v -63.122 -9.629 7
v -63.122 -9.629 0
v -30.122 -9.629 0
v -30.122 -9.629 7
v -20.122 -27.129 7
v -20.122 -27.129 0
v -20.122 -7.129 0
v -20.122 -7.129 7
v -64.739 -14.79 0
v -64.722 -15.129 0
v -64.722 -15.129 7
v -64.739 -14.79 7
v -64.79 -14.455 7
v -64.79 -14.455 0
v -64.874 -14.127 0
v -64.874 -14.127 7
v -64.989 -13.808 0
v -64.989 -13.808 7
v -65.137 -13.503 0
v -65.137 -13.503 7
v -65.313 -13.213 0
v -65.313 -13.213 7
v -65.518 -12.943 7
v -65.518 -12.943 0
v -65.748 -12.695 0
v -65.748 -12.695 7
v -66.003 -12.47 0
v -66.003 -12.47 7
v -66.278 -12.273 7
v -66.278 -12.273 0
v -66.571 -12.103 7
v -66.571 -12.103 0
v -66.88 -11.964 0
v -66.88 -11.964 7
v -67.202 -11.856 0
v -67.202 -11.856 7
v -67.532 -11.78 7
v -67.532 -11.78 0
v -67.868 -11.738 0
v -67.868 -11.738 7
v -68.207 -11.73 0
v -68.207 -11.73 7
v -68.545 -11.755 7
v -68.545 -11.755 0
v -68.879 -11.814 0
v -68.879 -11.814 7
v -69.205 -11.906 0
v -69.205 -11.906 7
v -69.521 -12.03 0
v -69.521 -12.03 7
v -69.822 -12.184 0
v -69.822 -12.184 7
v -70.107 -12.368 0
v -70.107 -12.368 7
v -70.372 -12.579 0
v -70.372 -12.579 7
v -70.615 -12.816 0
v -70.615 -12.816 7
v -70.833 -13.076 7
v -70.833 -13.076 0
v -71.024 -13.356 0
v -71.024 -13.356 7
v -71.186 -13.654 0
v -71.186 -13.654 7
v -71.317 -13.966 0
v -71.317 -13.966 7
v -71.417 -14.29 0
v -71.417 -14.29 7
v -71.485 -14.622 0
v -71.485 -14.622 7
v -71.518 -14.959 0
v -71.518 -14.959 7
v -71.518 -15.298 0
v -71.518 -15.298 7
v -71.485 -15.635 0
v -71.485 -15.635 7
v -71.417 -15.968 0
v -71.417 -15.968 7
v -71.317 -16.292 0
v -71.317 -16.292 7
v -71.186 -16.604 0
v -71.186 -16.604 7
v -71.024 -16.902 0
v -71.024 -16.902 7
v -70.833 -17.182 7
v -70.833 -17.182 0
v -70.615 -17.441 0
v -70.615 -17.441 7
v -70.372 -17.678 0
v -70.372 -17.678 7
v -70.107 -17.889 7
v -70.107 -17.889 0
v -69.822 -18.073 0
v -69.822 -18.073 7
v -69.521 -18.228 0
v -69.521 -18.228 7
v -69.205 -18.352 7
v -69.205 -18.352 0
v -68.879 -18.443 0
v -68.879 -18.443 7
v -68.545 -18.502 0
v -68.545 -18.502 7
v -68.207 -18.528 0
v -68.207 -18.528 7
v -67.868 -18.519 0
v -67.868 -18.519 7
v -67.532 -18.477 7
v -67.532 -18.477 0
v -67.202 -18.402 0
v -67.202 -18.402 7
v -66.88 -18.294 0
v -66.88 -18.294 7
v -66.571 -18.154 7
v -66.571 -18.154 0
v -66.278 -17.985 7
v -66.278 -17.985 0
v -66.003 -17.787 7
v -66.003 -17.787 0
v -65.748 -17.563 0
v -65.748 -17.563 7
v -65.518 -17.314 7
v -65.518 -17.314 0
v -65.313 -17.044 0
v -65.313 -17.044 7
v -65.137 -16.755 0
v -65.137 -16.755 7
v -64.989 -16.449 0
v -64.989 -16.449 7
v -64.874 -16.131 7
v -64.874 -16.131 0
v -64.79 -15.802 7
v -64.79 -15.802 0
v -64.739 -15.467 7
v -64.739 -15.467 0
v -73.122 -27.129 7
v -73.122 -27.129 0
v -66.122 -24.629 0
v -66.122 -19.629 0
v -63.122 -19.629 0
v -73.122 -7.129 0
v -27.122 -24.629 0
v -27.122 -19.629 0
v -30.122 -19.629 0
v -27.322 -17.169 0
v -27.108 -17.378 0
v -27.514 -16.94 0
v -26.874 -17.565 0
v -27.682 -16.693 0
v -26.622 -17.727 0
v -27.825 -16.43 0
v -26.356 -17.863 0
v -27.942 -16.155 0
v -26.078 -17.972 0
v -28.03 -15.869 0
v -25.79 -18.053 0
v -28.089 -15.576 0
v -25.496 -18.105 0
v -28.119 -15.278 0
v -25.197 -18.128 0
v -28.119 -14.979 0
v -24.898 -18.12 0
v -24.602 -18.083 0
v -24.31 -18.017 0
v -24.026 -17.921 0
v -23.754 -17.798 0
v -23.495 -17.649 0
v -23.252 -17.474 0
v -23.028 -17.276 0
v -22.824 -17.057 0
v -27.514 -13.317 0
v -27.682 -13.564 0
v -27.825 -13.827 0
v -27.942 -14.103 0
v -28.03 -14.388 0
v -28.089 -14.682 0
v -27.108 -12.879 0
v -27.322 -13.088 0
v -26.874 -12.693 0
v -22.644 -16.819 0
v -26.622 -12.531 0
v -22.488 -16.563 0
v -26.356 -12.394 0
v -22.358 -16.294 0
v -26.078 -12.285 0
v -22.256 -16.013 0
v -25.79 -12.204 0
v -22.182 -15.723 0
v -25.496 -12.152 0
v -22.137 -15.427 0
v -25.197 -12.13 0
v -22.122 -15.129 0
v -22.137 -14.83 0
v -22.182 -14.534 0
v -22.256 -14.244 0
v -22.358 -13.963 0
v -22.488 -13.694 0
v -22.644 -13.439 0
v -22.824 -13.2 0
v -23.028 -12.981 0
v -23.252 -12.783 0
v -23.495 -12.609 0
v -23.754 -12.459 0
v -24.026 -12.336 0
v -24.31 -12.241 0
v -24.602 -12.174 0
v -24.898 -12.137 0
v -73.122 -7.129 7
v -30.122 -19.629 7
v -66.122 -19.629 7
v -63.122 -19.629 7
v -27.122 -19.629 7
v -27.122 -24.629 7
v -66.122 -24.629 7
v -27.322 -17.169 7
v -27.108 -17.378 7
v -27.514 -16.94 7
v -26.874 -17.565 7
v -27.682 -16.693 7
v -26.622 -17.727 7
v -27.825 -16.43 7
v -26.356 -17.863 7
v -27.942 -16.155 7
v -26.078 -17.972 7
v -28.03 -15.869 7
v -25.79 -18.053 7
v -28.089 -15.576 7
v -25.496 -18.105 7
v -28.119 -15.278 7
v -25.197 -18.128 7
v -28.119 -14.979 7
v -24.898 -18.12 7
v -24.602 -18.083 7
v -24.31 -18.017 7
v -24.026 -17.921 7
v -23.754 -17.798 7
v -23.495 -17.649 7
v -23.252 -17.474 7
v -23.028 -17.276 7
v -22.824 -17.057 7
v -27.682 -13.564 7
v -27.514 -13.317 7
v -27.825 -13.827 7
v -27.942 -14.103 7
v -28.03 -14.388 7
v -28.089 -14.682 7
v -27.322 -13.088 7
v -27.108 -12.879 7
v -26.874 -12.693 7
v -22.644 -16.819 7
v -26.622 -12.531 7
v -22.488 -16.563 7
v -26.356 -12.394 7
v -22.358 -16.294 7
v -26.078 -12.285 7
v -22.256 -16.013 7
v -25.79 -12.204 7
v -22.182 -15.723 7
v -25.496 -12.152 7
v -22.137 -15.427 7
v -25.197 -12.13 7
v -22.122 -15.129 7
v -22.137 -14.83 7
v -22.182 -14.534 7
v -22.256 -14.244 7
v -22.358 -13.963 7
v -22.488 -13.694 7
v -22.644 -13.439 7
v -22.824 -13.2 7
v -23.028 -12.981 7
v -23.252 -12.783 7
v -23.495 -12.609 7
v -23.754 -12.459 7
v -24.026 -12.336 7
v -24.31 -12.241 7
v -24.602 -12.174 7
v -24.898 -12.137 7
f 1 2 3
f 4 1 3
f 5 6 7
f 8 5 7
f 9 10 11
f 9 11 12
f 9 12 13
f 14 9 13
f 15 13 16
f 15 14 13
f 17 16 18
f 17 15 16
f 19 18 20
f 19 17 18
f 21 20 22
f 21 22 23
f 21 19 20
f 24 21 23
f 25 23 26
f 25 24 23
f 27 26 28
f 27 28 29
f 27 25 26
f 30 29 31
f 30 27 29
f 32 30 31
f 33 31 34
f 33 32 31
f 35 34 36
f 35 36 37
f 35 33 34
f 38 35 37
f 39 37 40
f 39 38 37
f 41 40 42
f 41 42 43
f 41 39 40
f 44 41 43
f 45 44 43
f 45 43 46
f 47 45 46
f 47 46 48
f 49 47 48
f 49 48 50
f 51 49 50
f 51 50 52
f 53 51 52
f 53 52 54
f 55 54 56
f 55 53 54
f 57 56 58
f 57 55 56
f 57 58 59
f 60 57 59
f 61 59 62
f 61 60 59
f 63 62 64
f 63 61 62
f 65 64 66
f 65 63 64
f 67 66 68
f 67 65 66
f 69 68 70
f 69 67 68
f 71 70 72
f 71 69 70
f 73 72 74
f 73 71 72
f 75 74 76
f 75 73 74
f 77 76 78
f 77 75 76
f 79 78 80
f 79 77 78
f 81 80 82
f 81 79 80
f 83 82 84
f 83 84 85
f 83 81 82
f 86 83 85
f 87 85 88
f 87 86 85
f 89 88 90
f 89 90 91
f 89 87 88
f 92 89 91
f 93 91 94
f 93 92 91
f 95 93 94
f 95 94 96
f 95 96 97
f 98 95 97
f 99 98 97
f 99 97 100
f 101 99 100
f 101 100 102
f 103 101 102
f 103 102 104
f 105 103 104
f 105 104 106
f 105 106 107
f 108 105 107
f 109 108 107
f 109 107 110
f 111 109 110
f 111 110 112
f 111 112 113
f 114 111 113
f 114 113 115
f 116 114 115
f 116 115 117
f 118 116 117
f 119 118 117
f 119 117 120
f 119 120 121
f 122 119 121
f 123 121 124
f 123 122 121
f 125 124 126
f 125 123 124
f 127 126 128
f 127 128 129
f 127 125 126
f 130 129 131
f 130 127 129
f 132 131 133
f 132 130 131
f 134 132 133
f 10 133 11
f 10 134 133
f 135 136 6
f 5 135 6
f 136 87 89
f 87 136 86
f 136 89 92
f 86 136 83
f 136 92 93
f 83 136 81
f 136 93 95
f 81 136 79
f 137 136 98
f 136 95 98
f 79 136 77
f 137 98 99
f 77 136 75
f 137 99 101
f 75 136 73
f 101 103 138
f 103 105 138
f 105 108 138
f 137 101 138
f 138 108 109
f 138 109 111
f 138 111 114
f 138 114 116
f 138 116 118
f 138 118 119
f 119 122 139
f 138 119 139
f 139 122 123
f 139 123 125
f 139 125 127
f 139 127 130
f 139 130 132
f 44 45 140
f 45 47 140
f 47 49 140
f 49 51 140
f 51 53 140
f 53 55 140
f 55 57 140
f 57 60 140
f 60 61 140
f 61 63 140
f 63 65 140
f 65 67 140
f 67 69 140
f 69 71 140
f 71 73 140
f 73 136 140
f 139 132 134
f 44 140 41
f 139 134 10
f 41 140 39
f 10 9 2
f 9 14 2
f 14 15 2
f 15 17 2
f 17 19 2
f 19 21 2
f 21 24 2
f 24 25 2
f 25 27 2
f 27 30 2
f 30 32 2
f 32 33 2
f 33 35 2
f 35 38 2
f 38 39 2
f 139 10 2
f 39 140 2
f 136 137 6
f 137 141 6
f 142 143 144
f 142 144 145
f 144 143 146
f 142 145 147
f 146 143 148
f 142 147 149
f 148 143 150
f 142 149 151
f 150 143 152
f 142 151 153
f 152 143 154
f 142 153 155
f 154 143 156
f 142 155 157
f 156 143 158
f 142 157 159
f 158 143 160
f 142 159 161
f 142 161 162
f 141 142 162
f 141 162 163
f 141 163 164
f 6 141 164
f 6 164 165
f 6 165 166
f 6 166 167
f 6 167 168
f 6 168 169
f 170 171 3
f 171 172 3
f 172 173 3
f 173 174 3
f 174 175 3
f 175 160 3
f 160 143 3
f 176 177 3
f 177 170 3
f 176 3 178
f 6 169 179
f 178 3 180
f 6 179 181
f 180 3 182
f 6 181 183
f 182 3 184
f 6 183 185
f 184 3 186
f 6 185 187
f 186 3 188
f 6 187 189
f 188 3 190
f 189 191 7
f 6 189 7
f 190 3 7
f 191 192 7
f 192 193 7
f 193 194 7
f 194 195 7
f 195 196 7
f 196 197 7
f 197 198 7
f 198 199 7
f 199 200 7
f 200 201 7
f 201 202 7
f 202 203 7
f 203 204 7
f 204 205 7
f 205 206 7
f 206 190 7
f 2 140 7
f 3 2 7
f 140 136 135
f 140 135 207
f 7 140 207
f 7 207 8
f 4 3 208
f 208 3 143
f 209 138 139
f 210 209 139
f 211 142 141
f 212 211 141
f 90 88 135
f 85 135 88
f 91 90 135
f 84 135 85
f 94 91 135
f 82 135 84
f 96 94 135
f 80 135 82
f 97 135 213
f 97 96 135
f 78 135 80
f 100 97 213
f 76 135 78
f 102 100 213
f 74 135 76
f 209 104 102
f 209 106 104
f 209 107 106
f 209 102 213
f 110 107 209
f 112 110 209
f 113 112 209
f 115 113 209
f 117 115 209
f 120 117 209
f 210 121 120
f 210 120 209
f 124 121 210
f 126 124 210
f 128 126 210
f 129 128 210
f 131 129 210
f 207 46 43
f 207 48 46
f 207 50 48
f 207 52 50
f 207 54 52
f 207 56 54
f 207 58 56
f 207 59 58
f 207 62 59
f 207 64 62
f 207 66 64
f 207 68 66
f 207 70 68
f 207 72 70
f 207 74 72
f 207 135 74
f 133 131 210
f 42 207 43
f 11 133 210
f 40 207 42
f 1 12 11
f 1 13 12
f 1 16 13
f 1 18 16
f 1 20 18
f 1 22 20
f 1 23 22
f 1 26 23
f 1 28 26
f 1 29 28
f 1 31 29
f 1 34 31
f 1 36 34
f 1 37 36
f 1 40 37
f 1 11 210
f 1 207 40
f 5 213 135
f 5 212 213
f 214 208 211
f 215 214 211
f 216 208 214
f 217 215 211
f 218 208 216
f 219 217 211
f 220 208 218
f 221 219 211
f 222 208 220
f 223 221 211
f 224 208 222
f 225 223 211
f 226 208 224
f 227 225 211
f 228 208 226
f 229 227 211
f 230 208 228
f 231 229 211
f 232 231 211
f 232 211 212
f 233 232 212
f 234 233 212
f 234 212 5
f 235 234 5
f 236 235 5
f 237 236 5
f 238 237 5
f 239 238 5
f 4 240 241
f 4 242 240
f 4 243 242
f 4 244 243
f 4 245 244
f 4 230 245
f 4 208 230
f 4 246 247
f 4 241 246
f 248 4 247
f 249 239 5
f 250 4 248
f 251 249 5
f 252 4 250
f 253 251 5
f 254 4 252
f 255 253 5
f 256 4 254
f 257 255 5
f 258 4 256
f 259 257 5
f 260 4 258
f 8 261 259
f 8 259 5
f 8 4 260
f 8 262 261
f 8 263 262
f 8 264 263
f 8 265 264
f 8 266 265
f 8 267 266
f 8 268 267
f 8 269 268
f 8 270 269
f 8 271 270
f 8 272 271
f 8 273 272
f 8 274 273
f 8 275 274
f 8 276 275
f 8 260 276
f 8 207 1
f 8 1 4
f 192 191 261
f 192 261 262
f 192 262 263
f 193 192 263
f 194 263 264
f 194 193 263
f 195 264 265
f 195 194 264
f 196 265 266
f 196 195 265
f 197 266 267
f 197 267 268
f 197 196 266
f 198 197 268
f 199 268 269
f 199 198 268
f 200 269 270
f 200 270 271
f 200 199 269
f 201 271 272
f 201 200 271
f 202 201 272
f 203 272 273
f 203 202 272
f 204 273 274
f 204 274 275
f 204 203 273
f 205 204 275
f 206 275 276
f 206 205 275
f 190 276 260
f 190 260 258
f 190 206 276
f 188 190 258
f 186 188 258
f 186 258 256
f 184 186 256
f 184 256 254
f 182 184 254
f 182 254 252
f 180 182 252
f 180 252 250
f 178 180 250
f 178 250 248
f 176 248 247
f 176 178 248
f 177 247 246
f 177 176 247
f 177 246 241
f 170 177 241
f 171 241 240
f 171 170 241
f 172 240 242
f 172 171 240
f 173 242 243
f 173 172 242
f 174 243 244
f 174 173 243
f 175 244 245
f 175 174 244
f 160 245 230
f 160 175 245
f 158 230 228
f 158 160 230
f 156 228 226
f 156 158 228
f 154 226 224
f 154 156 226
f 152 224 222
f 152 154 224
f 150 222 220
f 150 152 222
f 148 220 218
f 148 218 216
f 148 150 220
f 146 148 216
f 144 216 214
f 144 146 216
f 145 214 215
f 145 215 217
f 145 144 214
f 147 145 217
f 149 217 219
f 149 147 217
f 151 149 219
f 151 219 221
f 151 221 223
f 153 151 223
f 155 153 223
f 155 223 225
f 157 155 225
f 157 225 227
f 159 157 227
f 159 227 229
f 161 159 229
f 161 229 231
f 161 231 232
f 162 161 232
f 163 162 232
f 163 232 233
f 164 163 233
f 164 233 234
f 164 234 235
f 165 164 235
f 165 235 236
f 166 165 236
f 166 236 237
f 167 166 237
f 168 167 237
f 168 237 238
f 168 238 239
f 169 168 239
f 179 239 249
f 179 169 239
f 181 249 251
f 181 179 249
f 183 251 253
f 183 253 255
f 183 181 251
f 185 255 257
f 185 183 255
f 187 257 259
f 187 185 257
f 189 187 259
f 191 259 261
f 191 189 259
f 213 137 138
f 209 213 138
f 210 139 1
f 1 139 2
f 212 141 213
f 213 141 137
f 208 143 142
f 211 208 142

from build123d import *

# Parameters (mm, degrees)
SKETCH1_W           = 53
SKETCH1_H           = 20
SKETCH1_R           = 3.4
SKETCH1_R_2         = 3
BOSS_EXTRUDE2_DEPTH = 7


with BuildPart() as part:
    # Sketch1 → Boss-Extrude2 (new body)
    with BuildSketch(Plane.XY):
        with Locations((-46.622487041, -17.128716042)):
            Rectangle(SKETCH1_W, SKETCH1_H)
        with Locations((-68.122487041, -15.128716042)):
            Circle(SKETCH1_R, mode=Mode.SUBTRACT)
        Polygon((-63.122487041, -19.628716042), (-63.122487041, -9.628716042), (-30.122487041, -9.628716042), (-30.122487041, -19.628716042), (-27.122487041, -19.628716042), (-27.122487041, -24.628716042), (-30.122487041, -24.628716042), (-63.122487041, -24.628716042), (-66.122487041, -24.628716042), (-66.122487041, -19.628716042), align=None, mode=Mode.SUBTRACT)
        with Locations((-25.122487041, -15.128716042)):
            Circle(SKETCH1_R_2, mode=Mode.SUBTRACT)
    extrude(amount=BOSS_EXTRUDE2_DEPTH)


solid = part.part
